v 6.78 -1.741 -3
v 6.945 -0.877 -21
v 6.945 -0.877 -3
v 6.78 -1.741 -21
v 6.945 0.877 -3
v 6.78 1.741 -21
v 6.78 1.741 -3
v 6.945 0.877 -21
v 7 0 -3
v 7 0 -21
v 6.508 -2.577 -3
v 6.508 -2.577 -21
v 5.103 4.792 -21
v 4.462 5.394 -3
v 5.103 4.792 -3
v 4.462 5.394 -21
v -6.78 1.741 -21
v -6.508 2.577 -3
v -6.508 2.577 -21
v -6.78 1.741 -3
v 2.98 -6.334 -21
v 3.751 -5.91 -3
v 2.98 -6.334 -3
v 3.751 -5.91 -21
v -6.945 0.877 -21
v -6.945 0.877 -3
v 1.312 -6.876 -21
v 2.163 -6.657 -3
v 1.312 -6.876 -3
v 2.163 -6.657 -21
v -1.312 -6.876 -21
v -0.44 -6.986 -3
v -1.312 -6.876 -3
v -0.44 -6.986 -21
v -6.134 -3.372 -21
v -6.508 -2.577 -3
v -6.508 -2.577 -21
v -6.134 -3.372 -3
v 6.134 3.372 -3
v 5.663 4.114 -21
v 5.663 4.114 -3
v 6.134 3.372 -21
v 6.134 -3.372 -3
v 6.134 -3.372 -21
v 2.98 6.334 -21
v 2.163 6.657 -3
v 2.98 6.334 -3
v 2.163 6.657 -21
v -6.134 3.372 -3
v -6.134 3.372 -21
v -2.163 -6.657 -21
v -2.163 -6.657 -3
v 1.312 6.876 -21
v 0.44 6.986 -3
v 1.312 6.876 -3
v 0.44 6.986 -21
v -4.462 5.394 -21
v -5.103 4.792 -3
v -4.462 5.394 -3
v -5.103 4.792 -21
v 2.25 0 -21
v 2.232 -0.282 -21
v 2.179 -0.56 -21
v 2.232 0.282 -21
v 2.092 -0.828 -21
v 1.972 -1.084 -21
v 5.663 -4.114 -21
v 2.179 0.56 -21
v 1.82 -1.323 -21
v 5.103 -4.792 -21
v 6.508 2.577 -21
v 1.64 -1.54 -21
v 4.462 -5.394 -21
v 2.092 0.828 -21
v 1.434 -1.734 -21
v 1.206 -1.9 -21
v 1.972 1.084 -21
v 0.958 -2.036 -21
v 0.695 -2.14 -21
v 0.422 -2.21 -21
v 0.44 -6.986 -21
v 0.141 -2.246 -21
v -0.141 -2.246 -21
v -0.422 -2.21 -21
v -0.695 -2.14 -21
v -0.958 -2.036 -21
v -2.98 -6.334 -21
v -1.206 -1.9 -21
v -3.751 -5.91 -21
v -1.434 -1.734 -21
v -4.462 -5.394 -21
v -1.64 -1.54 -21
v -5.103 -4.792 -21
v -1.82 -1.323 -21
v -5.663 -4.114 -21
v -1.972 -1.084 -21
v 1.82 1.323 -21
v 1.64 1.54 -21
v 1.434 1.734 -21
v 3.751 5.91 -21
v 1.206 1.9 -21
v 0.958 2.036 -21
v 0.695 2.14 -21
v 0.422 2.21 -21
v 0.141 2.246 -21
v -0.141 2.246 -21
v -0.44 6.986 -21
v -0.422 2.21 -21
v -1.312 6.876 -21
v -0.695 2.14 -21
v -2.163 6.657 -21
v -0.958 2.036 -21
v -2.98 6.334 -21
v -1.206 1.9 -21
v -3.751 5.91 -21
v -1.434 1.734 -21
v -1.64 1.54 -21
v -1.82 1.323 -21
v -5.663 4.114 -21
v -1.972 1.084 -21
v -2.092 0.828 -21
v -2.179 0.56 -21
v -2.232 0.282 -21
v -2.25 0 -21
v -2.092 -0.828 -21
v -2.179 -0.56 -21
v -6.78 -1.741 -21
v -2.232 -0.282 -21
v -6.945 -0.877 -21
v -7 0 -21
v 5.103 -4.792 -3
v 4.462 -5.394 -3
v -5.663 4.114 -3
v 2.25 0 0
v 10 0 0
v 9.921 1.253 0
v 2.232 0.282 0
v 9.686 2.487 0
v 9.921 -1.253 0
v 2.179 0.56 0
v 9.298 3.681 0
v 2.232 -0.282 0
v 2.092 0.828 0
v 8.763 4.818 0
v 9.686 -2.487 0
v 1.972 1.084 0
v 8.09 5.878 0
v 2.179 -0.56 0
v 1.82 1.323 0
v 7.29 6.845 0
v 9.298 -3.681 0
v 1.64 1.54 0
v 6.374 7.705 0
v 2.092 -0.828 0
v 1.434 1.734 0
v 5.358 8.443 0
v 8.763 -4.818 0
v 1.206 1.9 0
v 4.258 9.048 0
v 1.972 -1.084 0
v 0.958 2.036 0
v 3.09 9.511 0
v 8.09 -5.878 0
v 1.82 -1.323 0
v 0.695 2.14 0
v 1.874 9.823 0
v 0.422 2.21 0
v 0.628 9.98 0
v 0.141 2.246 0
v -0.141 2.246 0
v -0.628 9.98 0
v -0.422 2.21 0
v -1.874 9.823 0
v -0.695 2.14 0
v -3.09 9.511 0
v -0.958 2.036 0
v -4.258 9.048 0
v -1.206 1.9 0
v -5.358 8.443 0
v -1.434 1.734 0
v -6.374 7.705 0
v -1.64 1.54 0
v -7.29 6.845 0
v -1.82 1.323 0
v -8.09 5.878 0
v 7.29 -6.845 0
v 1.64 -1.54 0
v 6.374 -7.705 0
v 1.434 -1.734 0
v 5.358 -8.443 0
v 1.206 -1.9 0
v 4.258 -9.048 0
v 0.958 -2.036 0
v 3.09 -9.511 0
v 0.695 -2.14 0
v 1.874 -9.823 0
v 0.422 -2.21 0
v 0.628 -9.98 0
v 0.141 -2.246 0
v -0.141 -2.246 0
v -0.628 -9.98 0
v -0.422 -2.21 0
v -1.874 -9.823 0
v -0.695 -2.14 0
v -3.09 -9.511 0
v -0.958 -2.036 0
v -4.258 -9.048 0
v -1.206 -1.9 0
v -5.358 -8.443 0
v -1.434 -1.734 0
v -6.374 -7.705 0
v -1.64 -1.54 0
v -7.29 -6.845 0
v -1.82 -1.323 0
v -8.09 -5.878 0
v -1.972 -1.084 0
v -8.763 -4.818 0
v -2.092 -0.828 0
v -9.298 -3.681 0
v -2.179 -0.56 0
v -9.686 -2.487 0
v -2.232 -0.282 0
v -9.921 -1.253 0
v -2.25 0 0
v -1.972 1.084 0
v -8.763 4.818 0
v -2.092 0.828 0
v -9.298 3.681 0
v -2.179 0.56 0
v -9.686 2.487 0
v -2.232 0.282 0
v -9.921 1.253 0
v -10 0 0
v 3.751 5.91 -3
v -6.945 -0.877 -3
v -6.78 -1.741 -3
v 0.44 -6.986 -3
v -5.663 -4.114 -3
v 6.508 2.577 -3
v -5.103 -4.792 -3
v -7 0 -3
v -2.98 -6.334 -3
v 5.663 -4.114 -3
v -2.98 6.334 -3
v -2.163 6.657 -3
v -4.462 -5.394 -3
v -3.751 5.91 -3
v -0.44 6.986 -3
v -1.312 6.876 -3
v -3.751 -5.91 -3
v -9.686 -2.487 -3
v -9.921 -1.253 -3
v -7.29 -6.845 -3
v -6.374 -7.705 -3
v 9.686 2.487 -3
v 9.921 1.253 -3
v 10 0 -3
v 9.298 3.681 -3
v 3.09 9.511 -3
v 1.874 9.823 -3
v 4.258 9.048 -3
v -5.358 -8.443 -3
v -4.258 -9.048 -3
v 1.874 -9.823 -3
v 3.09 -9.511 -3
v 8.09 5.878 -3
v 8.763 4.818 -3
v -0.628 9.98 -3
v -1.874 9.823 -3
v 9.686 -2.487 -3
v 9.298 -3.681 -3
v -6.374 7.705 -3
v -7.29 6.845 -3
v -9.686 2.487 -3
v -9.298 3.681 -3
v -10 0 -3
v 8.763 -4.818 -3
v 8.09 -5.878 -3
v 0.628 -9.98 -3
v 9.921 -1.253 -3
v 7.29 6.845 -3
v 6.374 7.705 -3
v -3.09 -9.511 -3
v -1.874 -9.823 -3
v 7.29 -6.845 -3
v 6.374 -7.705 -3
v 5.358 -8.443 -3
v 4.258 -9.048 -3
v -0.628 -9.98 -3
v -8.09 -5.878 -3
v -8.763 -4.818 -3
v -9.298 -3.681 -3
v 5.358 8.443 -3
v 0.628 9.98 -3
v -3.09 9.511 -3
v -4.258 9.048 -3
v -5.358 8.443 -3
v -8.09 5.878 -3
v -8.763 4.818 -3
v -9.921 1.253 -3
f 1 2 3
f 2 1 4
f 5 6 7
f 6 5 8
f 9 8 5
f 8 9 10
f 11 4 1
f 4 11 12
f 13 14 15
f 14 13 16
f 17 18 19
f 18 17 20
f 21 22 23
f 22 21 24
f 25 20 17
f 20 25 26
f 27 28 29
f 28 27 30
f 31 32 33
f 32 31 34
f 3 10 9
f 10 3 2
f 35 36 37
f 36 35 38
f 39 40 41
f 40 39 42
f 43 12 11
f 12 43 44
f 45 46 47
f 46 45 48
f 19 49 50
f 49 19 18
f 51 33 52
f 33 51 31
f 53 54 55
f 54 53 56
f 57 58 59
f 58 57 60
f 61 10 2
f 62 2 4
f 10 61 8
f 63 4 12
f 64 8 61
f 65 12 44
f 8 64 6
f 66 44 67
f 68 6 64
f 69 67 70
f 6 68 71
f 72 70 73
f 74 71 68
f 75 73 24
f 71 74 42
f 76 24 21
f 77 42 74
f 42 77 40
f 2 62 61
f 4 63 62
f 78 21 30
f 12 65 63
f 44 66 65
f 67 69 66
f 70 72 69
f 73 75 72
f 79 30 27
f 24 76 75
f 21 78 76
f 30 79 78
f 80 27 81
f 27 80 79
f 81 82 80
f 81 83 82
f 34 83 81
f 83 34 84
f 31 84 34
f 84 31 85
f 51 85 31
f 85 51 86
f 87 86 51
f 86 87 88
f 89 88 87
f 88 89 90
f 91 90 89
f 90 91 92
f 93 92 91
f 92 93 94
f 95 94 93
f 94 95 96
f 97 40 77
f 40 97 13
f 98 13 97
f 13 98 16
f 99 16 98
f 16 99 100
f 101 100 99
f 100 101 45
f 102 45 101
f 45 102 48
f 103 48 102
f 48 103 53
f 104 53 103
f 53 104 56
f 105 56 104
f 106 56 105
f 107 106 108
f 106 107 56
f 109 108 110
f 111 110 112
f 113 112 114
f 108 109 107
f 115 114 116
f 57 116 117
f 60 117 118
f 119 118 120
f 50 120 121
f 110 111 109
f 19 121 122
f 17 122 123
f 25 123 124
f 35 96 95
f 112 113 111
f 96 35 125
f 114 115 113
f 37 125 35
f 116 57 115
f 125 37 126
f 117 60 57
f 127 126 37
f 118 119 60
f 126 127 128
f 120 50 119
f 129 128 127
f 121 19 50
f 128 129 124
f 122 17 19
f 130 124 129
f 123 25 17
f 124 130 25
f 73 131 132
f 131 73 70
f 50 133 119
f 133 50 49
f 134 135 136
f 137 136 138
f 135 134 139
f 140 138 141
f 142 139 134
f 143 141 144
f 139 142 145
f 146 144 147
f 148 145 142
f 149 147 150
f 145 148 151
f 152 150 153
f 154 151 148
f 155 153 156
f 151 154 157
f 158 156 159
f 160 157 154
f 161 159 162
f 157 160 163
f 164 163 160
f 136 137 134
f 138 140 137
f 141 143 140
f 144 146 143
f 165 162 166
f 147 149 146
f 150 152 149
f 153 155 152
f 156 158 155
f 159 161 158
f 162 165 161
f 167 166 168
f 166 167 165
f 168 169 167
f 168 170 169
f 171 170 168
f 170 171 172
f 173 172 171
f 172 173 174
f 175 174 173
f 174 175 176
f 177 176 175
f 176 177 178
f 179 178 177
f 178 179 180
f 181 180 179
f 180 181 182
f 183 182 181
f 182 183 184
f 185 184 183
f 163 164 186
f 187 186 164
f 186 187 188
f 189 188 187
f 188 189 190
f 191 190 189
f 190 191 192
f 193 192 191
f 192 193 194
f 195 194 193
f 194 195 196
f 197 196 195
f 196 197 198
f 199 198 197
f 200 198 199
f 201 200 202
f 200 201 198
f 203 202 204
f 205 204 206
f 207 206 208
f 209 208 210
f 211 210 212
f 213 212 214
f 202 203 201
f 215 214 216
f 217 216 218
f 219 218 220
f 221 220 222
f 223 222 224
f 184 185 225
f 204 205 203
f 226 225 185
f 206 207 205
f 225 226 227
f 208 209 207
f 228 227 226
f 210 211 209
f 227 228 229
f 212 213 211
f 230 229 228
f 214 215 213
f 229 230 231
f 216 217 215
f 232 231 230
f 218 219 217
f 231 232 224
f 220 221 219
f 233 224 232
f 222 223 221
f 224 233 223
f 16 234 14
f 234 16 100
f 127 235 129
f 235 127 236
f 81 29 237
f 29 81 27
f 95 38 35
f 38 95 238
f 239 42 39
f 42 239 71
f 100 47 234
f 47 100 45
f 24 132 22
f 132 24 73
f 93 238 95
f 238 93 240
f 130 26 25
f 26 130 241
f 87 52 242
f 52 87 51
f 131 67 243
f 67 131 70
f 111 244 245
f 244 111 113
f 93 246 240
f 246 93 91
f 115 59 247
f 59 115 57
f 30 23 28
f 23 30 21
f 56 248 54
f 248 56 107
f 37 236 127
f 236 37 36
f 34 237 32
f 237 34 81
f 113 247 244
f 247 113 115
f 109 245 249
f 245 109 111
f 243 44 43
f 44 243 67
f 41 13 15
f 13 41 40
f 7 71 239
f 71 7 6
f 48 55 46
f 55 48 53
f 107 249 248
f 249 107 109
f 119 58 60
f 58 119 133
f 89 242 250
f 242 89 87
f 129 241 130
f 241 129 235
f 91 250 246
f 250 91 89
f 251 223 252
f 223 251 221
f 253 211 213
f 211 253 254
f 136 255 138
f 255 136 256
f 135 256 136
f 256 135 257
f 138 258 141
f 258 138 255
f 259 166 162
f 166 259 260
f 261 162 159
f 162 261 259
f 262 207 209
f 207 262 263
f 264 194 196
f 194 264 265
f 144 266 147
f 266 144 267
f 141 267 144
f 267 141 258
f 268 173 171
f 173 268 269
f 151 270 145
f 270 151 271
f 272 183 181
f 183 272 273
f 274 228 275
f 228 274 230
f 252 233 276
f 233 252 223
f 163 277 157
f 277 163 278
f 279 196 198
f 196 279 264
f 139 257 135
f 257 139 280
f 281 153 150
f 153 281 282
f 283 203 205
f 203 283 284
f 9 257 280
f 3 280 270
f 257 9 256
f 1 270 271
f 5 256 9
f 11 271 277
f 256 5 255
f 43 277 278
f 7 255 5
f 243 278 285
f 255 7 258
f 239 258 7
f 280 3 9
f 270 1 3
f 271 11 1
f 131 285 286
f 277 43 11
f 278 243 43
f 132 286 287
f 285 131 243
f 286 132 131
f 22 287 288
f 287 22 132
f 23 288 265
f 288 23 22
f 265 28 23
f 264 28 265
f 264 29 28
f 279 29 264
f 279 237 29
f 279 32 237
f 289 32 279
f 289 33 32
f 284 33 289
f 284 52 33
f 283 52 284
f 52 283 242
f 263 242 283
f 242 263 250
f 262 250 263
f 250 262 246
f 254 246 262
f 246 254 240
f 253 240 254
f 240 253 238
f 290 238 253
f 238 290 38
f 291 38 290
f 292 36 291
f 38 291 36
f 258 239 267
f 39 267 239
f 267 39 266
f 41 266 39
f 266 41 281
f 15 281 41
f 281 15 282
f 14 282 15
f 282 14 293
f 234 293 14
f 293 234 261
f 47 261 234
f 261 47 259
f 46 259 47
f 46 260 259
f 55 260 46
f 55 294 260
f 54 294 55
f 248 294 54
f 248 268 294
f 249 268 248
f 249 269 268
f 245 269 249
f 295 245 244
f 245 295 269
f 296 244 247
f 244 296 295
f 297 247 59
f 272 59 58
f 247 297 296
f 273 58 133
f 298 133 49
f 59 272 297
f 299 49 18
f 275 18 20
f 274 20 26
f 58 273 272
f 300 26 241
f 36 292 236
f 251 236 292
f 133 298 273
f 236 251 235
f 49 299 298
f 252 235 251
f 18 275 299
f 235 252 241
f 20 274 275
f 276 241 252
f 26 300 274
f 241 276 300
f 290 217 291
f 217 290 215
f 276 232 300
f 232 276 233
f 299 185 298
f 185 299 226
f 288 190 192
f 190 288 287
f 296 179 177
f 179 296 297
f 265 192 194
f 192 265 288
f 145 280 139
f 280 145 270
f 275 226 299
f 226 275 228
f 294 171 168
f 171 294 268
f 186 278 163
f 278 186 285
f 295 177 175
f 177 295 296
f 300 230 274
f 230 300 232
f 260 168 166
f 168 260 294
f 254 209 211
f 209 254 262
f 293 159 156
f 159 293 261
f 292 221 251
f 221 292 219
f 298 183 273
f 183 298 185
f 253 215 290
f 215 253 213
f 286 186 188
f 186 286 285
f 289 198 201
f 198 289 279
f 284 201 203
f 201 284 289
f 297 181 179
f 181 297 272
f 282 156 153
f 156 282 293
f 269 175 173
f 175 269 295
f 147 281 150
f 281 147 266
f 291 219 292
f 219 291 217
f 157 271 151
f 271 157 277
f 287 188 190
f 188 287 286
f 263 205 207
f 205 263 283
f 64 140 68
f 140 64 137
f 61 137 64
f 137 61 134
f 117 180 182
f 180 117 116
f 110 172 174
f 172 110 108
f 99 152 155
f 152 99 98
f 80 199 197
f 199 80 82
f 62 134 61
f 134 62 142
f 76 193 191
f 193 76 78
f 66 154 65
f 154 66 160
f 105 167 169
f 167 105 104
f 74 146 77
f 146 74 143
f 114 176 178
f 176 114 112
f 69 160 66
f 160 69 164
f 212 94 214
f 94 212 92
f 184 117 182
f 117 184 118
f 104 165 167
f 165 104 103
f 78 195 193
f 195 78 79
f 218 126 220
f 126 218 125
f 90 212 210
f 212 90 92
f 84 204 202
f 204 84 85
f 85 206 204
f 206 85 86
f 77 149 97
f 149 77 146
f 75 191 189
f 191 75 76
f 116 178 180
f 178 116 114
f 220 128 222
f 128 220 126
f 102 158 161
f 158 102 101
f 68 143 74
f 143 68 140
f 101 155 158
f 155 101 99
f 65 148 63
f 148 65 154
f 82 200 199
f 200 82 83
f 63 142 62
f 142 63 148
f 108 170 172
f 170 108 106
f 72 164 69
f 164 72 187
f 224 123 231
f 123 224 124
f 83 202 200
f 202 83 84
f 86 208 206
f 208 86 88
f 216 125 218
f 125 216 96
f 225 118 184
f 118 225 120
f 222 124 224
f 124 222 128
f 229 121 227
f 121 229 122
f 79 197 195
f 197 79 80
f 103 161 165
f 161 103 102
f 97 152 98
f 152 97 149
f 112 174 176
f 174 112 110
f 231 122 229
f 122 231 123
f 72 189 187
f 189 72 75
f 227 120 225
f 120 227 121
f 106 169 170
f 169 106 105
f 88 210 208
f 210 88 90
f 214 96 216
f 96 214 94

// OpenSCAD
$fn = 50;


difference() {
	union() {
		translate(v = [0, 0, -21.0000000000]) {
			cylinder(h = 21, r = 7.0000000000);
		}
		translate(v = [0, 0, -3.0000000000]) {
			cylinder(h = 3, r = 10.0000000000);
		}
	}
	union() {
		#translate(v = [0, 0, -21]) {
			cylinder(h = 21, r = 2.2500000000);
		}
	}
}
